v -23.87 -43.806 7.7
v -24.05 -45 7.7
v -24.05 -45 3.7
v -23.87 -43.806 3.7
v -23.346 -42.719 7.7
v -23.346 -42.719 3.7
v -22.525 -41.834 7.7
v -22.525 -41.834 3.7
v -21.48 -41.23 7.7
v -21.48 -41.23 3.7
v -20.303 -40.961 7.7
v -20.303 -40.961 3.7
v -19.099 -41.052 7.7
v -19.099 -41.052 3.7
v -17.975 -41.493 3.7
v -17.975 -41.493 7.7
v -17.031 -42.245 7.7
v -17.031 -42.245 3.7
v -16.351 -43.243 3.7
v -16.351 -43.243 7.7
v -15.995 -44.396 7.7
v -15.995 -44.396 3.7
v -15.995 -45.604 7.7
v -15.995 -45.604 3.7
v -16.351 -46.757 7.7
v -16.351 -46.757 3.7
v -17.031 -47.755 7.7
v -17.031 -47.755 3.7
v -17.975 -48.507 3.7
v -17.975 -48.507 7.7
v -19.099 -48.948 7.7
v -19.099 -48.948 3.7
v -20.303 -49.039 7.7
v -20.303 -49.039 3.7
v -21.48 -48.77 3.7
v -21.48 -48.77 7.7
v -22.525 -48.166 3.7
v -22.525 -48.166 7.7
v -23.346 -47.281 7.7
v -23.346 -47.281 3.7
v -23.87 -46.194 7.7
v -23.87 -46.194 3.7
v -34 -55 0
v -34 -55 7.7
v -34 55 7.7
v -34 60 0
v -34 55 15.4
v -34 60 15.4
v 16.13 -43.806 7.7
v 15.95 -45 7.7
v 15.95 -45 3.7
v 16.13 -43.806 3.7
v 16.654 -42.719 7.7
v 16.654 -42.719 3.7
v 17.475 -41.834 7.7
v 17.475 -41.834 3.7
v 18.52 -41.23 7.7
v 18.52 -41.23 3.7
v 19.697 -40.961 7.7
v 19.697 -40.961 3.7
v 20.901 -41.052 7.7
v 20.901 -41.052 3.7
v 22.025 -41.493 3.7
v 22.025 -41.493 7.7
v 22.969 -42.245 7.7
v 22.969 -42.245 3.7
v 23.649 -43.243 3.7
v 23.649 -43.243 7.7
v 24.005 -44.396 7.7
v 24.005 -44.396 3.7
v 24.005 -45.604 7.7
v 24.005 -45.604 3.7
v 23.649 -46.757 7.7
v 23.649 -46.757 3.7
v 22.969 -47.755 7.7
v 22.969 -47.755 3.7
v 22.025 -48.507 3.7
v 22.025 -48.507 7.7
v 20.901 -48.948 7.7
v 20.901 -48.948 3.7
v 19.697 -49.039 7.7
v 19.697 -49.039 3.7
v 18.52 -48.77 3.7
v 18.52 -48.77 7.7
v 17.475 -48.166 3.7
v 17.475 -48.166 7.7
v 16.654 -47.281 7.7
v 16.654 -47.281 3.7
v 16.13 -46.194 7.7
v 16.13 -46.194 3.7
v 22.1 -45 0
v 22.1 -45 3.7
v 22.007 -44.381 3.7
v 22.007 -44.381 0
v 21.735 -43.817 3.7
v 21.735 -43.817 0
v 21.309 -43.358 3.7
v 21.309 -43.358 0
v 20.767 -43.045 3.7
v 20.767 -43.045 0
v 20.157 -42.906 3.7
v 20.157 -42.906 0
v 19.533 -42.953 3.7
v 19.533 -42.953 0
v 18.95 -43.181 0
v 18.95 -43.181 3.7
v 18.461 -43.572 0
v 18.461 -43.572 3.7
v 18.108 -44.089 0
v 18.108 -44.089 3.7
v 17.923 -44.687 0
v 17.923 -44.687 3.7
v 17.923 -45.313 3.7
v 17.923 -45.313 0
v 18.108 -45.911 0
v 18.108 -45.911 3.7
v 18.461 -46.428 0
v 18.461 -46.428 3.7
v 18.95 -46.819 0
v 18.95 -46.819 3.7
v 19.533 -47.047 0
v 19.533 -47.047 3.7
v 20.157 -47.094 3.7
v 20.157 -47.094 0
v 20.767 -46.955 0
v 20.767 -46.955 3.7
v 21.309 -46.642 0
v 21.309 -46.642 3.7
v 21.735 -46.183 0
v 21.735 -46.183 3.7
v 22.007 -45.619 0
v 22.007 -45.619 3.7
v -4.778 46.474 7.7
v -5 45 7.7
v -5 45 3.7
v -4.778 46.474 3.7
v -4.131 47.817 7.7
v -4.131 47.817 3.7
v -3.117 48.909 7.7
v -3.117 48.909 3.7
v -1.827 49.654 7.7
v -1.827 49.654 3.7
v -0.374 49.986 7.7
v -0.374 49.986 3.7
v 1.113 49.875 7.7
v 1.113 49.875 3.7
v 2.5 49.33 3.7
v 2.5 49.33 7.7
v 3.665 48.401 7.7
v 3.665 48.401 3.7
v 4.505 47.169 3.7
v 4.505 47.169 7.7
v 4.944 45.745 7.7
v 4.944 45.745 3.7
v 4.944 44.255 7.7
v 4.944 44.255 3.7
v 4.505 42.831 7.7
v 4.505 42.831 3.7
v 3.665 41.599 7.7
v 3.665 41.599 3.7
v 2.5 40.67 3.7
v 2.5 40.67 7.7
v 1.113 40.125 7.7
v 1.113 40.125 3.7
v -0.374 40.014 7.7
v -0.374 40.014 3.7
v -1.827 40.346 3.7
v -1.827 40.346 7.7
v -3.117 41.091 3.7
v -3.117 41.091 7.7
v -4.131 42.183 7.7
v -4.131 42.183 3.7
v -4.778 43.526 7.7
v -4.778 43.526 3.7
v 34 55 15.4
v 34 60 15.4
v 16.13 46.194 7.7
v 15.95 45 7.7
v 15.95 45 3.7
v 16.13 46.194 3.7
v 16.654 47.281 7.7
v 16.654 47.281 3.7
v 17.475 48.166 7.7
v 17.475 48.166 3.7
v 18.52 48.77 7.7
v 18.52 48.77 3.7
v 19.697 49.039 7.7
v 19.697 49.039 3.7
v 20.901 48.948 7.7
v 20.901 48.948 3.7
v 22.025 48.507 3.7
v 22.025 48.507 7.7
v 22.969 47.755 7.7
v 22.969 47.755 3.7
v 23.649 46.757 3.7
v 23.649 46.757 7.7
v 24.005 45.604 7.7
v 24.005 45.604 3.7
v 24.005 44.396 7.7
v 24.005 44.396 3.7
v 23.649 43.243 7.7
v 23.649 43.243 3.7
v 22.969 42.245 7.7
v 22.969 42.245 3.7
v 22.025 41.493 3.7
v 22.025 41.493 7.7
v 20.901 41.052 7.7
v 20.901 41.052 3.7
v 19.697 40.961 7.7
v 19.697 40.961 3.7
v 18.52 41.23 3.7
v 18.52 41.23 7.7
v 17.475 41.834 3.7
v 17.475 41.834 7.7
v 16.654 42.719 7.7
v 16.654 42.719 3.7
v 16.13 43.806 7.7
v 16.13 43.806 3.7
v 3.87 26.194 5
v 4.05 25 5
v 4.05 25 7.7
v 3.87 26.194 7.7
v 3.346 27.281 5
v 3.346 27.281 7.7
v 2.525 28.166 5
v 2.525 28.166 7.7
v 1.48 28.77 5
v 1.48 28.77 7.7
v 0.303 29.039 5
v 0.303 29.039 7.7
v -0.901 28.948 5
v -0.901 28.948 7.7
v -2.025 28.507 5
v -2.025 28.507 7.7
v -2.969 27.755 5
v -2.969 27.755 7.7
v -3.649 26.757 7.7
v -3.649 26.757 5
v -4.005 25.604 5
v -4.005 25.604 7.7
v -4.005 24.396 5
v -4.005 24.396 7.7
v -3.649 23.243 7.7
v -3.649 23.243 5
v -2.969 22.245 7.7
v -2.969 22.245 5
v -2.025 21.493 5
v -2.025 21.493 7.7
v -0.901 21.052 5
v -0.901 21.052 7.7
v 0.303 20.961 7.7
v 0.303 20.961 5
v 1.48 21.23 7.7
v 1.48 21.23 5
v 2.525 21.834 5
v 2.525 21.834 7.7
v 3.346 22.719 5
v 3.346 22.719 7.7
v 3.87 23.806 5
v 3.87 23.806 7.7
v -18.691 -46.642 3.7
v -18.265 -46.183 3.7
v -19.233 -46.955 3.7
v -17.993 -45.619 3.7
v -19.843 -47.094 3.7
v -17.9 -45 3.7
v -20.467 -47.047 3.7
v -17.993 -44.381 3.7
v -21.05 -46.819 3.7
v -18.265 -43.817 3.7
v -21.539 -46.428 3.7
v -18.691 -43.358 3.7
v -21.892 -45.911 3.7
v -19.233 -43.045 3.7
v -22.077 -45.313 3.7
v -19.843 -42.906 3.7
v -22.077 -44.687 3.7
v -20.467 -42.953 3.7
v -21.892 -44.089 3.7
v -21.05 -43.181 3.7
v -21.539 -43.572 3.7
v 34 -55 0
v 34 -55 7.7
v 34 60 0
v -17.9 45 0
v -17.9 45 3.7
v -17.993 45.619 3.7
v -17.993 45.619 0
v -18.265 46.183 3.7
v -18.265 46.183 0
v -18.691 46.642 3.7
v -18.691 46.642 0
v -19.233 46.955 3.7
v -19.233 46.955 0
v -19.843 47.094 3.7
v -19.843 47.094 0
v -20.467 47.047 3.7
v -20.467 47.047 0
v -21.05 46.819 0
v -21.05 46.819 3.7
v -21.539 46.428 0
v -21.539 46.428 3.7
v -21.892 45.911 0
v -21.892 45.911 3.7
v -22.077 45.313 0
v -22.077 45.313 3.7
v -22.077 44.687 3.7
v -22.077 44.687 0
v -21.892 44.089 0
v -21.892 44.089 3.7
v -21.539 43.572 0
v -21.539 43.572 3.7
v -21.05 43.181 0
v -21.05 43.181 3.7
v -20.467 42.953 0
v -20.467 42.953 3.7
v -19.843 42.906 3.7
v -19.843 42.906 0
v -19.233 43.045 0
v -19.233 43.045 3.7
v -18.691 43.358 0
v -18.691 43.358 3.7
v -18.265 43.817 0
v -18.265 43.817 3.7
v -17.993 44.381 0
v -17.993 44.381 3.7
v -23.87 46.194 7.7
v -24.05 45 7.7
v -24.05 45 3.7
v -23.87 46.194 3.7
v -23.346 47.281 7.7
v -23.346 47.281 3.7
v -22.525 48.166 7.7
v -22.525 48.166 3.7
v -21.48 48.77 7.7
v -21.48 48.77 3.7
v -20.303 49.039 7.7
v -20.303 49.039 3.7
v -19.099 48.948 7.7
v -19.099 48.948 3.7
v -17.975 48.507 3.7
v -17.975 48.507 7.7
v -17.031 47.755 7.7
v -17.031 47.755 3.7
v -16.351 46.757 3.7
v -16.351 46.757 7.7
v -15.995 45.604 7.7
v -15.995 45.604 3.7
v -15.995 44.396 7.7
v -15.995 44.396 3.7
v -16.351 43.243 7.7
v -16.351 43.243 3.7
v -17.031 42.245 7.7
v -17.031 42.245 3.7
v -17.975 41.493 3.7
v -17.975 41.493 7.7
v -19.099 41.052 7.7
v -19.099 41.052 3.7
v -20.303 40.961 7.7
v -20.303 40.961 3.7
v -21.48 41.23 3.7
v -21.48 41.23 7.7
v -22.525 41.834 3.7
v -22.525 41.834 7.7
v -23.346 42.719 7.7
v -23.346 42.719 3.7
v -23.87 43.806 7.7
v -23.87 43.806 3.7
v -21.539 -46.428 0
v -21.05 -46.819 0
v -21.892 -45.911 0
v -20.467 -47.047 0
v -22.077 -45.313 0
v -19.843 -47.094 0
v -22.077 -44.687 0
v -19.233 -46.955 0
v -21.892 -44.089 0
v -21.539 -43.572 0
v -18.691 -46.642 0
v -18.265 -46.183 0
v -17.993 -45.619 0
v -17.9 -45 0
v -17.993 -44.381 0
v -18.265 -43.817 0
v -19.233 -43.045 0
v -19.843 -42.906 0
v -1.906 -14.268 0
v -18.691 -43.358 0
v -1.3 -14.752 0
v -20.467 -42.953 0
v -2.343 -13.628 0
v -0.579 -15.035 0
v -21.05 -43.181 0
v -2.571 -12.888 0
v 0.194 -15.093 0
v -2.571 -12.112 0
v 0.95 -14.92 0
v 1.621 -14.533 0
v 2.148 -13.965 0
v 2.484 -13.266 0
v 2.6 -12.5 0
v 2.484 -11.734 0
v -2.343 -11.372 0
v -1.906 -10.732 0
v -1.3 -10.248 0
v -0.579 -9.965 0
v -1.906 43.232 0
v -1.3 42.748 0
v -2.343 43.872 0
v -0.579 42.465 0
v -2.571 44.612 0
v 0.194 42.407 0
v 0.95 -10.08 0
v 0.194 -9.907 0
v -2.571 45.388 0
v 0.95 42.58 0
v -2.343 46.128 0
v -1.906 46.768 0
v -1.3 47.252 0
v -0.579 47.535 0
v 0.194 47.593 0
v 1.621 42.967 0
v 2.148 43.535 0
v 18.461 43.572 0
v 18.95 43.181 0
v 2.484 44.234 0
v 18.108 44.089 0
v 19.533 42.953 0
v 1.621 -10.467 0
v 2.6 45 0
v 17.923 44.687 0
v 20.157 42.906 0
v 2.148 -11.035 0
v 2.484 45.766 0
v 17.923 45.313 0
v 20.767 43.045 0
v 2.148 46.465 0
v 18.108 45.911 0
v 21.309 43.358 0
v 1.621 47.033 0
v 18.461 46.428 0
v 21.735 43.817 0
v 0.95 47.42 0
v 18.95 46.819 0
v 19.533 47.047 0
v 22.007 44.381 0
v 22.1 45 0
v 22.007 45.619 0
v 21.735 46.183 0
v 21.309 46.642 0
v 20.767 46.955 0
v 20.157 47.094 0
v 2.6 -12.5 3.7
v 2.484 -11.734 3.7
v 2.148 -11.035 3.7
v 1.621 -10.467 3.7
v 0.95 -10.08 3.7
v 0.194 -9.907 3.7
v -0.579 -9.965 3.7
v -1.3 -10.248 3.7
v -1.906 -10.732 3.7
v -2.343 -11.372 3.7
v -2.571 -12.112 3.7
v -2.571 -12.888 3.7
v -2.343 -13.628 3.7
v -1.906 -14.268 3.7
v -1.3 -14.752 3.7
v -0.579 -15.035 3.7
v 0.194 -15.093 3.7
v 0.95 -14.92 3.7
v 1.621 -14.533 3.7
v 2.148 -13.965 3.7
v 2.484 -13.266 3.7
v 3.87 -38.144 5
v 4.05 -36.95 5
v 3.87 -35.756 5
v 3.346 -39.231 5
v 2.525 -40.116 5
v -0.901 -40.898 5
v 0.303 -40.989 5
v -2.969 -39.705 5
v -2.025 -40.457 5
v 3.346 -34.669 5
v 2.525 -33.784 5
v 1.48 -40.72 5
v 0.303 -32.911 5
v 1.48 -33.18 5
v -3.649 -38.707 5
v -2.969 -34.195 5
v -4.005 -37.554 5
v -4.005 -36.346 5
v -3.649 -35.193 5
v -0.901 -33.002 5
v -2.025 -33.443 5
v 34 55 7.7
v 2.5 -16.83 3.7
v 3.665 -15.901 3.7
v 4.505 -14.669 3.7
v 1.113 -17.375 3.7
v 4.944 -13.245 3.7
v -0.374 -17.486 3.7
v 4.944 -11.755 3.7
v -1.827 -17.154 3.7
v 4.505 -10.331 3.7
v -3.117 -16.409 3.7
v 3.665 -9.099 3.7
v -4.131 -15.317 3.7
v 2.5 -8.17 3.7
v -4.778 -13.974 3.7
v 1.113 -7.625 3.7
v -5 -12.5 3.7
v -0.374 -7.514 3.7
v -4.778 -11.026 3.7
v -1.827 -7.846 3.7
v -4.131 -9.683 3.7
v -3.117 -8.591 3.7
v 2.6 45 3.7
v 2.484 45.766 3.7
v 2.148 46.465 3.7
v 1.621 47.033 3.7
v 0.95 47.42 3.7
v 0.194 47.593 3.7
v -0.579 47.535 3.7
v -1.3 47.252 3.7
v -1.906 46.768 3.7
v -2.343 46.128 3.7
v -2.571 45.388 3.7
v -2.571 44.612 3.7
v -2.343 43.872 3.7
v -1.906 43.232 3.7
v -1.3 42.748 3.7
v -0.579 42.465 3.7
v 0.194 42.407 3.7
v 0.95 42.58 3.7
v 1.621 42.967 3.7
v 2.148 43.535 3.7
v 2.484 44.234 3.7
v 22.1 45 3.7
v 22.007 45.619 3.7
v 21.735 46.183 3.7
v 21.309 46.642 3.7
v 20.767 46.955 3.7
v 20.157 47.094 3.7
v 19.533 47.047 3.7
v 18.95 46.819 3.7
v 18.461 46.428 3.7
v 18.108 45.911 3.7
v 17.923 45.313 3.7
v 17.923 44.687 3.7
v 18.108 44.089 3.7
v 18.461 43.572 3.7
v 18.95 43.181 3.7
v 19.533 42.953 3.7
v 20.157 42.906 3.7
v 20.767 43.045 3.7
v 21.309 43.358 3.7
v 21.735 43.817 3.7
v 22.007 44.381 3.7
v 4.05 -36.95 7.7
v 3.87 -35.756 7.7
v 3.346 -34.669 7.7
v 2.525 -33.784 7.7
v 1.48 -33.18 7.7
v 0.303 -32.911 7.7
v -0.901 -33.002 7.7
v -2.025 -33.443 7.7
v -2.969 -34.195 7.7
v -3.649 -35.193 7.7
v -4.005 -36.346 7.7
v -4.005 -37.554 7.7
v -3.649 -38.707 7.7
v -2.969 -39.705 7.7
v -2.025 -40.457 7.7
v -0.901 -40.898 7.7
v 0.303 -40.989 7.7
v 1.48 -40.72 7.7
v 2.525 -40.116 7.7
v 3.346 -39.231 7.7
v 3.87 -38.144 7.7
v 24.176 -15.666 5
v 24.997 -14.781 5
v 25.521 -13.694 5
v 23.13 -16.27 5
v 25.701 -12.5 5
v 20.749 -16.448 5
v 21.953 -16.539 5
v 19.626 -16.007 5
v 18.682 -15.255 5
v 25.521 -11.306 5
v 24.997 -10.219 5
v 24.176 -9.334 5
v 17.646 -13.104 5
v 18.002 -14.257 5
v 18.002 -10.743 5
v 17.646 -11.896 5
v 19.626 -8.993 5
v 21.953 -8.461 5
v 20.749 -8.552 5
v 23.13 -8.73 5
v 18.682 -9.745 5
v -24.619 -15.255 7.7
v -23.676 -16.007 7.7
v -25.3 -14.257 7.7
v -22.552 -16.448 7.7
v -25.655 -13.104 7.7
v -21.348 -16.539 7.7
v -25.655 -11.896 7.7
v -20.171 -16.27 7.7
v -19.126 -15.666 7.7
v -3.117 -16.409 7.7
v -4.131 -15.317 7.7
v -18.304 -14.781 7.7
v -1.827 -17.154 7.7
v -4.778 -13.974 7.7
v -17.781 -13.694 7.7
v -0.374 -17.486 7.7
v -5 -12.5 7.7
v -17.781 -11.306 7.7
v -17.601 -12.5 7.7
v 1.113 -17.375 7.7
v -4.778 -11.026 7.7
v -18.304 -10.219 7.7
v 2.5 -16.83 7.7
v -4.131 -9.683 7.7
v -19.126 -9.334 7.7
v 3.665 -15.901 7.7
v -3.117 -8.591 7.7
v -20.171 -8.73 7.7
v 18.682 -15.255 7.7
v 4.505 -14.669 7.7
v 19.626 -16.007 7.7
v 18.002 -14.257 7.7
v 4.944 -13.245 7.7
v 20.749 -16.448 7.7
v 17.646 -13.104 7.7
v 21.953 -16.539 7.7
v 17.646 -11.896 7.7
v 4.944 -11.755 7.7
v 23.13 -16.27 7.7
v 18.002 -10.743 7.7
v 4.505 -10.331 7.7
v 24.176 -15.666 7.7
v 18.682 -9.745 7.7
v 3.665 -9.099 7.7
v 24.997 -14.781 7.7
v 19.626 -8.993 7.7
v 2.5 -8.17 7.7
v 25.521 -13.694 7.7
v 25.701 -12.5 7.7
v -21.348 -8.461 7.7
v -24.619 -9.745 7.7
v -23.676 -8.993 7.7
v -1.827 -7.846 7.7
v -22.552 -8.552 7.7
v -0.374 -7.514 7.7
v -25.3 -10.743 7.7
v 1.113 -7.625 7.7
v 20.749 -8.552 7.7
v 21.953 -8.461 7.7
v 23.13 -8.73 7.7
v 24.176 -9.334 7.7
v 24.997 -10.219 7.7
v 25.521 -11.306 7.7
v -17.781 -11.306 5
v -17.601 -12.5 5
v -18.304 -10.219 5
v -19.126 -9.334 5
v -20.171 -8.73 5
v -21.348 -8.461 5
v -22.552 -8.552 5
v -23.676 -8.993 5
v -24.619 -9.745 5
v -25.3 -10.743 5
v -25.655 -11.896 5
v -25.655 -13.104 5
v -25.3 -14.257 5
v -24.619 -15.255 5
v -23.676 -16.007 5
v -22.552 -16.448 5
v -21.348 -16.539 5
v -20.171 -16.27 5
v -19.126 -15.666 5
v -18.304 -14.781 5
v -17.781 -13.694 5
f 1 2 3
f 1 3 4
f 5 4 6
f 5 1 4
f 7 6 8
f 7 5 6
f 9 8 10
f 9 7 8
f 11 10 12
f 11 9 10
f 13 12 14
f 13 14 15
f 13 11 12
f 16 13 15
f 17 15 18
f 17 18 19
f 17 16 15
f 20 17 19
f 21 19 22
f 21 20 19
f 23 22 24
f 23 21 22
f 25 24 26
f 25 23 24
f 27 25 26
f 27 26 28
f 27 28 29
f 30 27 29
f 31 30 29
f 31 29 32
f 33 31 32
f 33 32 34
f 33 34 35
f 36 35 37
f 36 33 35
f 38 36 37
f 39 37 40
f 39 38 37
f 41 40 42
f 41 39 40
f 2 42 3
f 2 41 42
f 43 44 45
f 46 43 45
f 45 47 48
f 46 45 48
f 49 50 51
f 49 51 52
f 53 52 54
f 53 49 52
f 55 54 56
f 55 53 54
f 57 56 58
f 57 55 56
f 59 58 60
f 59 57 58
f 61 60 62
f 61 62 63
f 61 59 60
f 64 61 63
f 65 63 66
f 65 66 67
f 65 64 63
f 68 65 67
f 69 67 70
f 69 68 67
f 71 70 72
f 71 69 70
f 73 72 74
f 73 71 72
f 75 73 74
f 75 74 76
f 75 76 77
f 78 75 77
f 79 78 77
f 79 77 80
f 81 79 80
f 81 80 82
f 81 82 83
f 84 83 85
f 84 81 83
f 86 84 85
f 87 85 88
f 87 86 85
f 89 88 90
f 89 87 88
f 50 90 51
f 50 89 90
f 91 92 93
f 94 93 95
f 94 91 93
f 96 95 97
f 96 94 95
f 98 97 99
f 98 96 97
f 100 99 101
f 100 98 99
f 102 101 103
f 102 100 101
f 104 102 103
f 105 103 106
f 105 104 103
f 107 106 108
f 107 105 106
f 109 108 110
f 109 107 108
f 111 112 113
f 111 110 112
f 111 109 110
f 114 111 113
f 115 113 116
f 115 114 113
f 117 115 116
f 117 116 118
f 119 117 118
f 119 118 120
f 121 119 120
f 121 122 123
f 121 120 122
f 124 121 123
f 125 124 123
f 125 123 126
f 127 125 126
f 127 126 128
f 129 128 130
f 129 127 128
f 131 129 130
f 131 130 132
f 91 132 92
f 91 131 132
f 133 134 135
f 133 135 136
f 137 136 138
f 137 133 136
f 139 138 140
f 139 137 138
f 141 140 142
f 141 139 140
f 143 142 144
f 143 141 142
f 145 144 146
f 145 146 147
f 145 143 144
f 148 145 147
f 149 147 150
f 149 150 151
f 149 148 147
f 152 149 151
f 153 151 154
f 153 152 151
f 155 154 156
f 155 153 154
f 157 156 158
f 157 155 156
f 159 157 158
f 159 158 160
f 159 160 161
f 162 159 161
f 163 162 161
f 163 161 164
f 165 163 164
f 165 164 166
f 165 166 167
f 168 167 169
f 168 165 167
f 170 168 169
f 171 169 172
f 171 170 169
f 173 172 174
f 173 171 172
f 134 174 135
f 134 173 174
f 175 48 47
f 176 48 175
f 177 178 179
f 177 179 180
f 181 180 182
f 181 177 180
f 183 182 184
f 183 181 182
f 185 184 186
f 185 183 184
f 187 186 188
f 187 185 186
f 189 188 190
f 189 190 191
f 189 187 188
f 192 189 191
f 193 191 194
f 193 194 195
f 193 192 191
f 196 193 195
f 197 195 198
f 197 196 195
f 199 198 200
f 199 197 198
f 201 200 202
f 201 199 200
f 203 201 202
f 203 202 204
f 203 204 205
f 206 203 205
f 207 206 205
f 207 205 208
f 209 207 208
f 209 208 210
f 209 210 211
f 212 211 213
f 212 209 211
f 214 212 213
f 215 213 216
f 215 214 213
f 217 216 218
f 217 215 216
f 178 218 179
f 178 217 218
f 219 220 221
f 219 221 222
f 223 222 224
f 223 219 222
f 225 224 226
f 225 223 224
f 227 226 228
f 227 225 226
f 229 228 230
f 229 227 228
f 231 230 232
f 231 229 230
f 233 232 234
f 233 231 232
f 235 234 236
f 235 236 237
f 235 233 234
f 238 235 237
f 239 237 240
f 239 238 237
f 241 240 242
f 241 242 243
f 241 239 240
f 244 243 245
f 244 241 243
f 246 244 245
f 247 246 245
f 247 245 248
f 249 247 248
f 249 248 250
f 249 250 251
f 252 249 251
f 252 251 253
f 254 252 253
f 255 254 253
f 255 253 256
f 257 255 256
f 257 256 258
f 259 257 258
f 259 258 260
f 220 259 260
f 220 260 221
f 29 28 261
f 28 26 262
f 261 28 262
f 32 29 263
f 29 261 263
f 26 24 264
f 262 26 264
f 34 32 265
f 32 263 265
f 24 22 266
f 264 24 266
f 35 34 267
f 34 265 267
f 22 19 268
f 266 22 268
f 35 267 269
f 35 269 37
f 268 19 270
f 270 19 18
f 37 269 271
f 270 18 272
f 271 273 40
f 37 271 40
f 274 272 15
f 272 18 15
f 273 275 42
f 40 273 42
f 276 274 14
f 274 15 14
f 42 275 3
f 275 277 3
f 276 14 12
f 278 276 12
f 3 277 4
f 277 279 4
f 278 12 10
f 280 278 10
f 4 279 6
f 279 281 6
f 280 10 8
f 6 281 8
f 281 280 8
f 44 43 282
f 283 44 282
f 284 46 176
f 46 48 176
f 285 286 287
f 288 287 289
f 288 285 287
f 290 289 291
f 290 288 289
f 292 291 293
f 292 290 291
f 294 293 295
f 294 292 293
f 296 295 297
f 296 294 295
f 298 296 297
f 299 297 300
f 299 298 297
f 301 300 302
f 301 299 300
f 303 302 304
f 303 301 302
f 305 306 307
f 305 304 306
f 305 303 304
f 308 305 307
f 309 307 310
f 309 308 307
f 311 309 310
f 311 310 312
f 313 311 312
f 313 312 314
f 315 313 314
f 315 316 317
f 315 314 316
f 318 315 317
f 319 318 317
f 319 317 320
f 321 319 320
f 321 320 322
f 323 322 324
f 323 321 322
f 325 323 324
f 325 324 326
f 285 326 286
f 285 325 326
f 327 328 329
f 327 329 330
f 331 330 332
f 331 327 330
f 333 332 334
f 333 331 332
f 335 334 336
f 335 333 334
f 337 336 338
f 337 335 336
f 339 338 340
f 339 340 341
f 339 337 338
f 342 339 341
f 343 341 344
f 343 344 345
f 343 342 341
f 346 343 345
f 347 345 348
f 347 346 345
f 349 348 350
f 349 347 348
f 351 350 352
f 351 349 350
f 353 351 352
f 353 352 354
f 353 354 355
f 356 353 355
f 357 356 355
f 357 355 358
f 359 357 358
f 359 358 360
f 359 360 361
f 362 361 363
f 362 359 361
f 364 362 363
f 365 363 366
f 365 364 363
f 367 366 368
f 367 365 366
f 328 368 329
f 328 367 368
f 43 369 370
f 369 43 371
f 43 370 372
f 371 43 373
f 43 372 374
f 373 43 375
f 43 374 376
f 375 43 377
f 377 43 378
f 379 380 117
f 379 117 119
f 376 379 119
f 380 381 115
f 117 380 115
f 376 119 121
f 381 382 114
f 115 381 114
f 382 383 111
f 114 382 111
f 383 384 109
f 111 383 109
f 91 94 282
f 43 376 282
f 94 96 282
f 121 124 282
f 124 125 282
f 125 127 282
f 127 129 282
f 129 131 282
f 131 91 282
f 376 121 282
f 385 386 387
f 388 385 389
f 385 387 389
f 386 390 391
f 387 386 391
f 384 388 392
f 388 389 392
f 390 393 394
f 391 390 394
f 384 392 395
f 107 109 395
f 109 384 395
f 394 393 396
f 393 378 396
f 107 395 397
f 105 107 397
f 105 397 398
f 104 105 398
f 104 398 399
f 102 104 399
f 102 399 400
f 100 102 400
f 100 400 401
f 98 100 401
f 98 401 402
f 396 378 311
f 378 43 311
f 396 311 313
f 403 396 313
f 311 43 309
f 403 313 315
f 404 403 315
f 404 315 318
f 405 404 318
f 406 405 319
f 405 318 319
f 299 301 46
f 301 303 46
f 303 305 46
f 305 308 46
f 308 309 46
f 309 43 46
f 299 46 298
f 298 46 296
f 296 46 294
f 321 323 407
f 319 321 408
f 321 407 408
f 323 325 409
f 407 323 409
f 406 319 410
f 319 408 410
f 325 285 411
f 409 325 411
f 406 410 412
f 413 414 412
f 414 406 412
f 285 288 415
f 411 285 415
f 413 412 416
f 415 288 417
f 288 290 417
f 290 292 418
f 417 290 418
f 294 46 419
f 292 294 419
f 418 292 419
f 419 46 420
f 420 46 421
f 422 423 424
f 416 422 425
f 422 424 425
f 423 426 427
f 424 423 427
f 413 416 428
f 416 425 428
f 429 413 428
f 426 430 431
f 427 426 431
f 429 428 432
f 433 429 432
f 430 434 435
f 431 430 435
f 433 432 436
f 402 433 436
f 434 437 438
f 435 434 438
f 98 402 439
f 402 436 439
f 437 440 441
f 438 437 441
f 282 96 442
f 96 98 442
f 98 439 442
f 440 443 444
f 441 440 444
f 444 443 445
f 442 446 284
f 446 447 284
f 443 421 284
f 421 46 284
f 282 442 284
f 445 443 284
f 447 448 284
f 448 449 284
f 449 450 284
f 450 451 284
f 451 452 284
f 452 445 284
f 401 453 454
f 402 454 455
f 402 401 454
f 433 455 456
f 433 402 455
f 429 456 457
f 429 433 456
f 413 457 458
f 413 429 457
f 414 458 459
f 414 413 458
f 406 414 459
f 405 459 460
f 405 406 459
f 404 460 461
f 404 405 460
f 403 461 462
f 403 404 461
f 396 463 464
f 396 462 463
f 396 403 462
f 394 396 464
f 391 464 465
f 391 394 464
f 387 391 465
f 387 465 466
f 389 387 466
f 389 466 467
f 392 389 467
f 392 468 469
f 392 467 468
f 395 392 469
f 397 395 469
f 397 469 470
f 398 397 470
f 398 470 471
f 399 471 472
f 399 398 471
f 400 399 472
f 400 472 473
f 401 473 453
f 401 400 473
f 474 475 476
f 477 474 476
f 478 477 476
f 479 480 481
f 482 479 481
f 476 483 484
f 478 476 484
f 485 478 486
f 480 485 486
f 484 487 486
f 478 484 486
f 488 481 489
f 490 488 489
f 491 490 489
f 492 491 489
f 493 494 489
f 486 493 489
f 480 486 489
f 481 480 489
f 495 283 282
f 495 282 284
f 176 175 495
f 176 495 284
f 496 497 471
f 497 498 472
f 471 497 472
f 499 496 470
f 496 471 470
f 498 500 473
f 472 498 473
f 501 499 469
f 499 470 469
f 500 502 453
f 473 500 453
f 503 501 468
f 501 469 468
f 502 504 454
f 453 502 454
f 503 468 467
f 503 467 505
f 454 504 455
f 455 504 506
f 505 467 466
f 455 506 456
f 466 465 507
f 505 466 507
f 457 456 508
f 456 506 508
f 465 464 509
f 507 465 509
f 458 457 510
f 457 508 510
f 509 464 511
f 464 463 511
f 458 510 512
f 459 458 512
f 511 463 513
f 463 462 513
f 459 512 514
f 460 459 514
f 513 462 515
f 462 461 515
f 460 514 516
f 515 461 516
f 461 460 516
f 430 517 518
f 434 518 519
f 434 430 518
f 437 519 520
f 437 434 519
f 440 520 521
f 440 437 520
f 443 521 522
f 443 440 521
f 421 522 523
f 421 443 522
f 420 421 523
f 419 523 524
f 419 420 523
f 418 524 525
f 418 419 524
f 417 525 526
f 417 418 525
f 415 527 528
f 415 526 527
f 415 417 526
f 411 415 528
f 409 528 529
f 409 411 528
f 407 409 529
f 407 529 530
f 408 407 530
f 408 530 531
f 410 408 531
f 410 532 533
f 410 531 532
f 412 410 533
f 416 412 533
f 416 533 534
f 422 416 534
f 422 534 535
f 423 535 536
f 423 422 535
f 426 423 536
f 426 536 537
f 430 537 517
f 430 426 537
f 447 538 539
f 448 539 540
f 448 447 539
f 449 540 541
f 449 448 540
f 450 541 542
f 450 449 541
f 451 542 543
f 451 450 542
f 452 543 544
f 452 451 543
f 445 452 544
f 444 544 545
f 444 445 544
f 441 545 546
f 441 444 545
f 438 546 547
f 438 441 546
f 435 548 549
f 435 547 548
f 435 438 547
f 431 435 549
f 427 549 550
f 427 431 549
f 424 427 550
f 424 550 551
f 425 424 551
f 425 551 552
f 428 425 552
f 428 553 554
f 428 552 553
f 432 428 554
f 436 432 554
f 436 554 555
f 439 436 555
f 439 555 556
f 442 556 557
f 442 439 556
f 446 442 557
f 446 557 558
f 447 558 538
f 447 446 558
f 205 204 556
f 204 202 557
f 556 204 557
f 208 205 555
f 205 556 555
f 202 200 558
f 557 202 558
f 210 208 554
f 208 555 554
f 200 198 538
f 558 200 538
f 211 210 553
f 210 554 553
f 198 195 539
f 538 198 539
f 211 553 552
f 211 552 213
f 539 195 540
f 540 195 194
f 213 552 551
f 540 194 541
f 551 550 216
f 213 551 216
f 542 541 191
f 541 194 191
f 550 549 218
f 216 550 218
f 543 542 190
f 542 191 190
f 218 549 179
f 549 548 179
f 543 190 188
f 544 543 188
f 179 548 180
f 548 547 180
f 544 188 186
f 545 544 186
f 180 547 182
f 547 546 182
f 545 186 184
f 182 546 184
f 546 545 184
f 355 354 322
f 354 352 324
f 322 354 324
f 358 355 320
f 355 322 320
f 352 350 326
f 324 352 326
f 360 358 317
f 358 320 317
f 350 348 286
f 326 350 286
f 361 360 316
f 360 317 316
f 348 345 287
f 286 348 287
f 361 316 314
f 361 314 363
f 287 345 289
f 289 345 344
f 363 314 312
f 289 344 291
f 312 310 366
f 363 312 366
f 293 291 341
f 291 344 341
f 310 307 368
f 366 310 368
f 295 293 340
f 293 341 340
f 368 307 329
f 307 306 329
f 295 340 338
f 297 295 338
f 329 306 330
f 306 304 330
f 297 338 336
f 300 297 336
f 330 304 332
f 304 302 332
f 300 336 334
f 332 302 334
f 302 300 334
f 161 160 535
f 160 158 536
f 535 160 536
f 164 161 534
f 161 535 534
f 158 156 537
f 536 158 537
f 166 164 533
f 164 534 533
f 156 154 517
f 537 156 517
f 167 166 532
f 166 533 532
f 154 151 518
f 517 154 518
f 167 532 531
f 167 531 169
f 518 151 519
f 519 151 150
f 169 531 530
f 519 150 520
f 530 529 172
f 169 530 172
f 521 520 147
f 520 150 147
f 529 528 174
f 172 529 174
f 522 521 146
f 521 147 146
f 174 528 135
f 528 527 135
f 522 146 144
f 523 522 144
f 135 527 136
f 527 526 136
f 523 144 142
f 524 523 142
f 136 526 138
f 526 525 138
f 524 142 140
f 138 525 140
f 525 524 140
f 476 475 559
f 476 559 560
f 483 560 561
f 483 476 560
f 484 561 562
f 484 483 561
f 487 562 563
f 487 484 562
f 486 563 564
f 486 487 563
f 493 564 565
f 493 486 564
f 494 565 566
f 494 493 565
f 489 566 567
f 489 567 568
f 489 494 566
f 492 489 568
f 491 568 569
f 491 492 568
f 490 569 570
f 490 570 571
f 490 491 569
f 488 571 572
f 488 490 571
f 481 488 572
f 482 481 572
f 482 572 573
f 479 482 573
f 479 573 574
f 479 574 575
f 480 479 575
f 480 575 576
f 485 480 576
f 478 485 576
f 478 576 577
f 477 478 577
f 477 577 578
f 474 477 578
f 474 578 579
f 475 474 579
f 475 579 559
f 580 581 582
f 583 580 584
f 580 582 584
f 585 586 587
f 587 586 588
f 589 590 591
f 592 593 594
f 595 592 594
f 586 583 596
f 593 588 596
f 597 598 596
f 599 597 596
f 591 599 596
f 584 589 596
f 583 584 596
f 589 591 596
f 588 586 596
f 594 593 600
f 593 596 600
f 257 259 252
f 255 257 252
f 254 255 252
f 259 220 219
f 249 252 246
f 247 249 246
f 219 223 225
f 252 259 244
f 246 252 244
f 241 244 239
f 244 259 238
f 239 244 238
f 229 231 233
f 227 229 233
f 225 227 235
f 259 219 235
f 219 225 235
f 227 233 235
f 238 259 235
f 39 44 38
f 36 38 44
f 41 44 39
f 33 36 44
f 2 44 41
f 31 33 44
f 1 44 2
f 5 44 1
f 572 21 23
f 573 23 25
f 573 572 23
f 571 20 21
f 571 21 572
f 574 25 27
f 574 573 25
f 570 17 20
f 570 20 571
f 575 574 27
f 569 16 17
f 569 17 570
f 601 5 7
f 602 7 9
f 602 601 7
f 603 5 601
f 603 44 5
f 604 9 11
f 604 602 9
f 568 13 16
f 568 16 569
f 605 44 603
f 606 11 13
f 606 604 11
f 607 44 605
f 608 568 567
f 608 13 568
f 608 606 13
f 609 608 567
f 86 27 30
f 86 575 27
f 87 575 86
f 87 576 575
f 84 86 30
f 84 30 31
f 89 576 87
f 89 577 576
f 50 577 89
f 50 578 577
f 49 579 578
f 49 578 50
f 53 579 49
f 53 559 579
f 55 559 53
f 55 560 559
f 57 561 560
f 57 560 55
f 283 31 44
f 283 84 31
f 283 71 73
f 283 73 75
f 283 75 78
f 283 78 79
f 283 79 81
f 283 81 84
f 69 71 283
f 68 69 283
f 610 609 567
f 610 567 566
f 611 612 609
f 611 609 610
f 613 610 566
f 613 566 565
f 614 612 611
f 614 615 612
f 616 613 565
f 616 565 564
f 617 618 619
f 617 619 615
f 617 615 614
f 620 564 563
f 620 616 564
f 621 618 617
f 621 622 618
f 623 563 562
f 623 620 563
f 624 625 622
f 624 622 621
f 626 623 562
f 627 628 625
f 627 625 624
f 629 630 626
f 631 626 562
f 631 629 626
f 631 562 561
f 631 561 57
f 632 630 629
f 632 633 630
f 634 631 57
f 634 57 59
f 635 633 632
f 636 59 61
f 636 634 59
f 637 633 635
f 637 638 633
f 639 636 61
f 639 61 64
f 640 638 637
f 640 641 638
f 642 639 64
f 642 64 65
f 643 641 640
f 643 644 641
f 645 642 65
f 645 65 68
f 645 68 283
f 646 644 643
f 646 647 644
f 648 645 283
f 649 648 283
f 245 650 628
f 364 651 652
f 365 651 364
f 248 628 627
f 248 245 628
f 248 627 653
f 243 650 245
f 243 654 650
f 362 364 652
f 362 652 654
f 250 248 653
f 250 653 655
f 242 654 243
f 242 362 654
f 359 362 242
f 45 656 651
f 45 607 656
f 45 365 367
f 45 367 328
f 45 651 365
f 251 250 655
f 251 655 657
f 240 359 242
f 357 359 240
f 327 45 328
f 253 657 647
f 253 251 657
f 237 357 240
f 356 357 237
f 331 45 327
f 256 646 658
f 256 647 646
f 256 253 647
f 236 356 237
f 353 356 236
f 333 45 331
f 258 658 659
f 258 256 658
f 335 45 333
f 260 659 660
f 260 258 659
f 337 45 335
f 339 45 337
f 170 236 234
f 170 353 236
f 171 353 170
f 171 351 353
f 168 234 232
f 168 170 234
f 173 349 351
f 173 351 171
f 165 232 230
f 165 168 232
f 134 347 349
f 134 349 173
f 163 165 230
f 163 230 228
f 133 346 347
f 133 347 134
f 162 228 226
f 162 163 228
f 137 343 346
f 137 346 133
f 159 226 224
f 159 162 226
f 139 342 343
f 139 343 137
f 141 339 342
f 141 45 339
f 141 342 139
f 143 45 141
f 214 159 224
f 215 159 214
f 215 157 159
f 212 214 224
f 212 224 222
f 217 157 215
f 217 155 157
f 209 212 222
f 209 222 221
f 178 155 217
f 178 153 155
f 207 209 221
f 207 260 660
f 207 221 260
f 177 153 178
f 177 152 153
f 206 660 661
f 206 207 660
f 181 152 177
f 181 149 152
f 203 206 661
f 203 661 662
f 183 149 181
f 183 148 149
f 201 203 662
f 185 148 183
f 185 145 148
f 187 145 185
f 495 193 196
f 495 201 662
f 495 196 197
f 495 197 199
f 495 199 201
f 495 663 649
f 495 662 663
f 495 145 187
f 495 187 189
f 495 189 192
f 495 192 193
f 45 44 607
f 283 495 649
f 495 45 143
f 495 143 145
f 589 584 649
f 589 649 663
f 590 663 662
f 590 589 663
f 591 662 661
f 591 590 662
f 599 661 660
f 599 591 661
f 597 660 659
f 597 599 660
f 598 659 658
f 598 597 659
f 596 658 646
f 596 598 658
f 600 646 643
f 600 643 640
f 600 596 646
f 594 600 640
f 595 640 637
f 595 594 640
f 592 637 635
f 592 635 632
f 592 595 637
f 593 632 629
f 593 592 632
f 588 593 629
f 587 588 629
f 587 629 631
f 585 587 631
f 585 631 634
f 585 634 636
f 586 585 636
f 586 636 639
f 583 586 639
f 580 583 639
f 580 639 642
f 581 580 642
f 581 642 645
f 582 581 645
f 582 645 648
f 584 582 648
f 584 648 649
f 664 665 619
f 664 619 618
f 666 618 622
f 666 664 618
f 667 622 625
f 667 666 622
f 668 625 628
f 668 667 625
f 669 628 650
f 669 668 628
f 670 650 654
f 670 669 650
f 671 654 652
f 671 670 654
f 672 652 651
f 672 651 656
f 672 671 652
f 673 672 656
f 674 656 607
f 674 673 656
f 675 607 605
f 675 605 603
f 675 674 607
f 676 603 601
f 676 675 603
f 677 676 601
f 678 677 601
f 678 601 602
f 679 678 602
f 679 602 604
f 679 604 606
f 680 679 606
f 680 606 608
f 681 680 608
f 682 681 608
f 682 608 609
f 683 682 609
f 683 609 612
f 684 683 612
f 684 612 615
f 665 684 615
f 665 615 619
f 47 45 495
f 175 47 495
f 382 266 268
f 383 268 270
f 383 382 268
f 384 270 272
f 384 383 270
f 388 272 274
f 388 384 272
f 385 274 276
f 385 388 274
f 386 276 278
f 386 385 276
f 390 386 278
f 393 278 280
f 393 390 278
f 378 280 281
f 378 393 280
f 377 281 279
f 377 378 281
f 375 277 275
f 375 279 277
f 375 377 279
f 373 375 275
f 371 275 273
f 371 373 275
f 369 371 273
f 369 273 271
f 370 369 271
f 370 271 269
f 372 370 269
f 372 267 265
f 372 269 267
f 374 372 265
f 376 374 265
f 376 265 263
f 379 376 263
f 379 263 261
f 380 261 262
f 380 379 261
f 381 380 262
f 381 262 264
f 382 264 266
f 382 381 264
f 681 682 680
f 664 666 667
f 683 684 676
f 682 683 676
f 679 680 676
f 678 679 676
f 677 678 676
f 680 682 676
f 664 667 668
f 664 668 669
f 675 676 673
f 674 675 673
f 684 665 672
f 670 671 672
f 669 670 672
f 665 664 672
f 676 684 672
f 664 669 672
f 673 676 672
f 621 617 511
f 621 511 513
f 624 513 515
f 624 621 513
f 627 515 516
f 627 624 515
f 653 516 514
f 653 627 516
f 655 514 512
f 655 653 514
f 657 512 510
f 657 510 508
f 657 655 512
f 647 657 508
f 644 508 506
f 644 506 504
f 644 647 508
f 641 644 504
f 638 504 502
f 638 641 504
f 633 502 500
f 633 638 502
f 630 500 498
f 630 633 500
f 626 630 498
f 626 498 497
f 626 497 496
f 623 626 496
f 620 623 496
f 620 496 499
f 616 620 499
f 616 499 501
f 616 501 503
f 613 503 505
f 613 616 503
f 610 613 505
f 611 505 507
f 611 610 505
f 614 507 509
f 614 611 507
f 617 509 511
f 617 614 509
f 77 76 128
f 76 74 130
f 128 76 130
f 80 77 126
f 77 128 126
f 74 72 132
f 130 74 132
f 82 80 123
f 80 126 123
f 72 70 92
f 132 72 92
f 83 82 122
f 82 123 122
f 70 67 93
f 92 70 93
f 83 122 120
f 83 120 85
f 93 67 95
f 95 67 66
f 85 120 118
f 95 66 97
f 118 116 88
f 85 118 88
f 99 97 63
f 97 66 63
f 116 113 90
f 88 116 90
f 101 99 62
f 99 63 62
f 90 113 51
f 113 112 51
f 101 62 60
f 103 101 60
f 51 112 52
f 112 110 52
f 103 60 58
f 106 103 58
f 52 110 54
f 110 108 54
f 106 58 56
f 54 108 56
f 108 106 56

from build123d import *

# Parameters (mm, degrees)
SKETCH1_W                = 68
SKETCH1_H                = 110
SKETCH1_R                = 2.1
SKETCH1_R_2              = 4.05
SKETCH1_R_3              = 2.6
BOSS_EXTRUDE1_DEPTH      = 7.7
SKETCH2_R                = 6.304633146
SKETCH2_R_2              = 7.334333348
SKETCH2_R_3              = 8.114040952
SKETCH2_R_4              = 11.073656437
BOSS_EXTRUDE2_DEPTH      = 5
SKETCH3_R                = 4.05
SKETCH3_R_2              = 5
CUT_EXTRUDE1_DEPTH       = 4
SKETCH4_W                = 68
SKETCH4_H                = 5
BOSS_EXTRUDE3_DEPTH      = 7.7
BOSS_EXTRUDE3_DEPTH_BACK = 7.7


with BuildPart() as part:
    # Sketch1 → Boss-Extrude1 (new body)
    with BuildSketch(Plane.XY):
        Rectangle(SKETCH1_W, SKETCH1_H)
        with Locations((20, 45)):
            Circle(SKETCH1_R, mode=Mode.SUBTRACT)
        with Locations((-20, 45)):
            Circle(SKETCH1_R, mode=Mode.SUBTRACT)
        with Locations((20, -45)):
            Circle(SKETCH1_R, mode=Mode.SUBTRACT)
        with Locations((-20, -45)):
            Circle(SKETCH1_R, mode=Mode.SUBTRACT)
        with Locations((21.650635095, -12.5)):
            Circle(SKETCH1_R_2, mode=Mode.SUBTRACT)
        with Locations((0, 25)):
            Circle(SKETCH1_R_2, mode=Mode.SUBTRACT)
        with Locations((-21.650635095, -12.5)):
            Circle(SKETCH1_R_2, mode=Mode.SUBTRACT)
        with Locations((0, -36.95)):
            Circle(SKETCH1_R_2, mode=Mode.SUBTRACT)
        with Locations((0, 45)):
            Circle(SKETCH1_R_3, mode=Mode.SUBTRACT)
        with Locations((0, -12.5)):
            Circle(SKETCH1_R_3, mode=Mode.SUBTRACT)
    extrude(amount=BOSS_EXTRUDE1_DEPTH)

    # Sketch2 → Boss-Extrude2 (add)
    with BuildSketch(Plane(origin=(0, 0, 0), x_dir=(-1, 0, 0), z_dir=(0, 0, -1))):
        with Locations((-21.650635095, -12.5)):
            Circle(SKETCH2_R)
        with Locations((0, 25)):
            Circle(SKETCH2_R_2)
        with Locations((21.650635095, -12.5)):
            Circle(SKETCH2_R_3)
        with Locations((0, -36.95)):
            Circle(SKETCH2_R_4)
    extrude(amount=-BOSS_EXTRUDE2_DEPTH)

    # Sketch3 → Cut-Extrude1 (cut)
    with BuildSketch(Plane(origin=(0, 0, 7.7), x_dir=(-1, 0, 0), z_dir=(0, 0, -1))):
        with Locations((-20, 45)):
            Circle(SKETCH3_R)
        with Locations((20, 45)):
            Circle(SKETCH3_R)
        with Locations((-20, -45)):
            Circle(SKETCH3_R)
        with Locations((20, -45)):
            Circle(SKETCH3_R)
        with Locations((0, 45)):
            Circle(SKETCH3_R_2)
        with Locations((0, -12.5)):
            Circle(SKETCH3_R_2)
    extrude(amount=CUT_EXTRUDE1_DEPTH, mode=Mode.SUBTRACT)

    # Sketch4 → Boss-Extrude3 (add, two sides)
    with BuildSketch(Plane.XY.offset(7.7)) as boss_extrude3_sk:
        with Locations((0, 57.5)):
            Rectangle(SKETCH4_W, SKETCH4_H)
    extrude(amount=BOSS_EXTRUDE3_DEPTH)
    extrude(boss_extrude3_sk.sketch, amount=-BOSS_EXTRUDE3_DEPTH_BACK)


solid = part.part
